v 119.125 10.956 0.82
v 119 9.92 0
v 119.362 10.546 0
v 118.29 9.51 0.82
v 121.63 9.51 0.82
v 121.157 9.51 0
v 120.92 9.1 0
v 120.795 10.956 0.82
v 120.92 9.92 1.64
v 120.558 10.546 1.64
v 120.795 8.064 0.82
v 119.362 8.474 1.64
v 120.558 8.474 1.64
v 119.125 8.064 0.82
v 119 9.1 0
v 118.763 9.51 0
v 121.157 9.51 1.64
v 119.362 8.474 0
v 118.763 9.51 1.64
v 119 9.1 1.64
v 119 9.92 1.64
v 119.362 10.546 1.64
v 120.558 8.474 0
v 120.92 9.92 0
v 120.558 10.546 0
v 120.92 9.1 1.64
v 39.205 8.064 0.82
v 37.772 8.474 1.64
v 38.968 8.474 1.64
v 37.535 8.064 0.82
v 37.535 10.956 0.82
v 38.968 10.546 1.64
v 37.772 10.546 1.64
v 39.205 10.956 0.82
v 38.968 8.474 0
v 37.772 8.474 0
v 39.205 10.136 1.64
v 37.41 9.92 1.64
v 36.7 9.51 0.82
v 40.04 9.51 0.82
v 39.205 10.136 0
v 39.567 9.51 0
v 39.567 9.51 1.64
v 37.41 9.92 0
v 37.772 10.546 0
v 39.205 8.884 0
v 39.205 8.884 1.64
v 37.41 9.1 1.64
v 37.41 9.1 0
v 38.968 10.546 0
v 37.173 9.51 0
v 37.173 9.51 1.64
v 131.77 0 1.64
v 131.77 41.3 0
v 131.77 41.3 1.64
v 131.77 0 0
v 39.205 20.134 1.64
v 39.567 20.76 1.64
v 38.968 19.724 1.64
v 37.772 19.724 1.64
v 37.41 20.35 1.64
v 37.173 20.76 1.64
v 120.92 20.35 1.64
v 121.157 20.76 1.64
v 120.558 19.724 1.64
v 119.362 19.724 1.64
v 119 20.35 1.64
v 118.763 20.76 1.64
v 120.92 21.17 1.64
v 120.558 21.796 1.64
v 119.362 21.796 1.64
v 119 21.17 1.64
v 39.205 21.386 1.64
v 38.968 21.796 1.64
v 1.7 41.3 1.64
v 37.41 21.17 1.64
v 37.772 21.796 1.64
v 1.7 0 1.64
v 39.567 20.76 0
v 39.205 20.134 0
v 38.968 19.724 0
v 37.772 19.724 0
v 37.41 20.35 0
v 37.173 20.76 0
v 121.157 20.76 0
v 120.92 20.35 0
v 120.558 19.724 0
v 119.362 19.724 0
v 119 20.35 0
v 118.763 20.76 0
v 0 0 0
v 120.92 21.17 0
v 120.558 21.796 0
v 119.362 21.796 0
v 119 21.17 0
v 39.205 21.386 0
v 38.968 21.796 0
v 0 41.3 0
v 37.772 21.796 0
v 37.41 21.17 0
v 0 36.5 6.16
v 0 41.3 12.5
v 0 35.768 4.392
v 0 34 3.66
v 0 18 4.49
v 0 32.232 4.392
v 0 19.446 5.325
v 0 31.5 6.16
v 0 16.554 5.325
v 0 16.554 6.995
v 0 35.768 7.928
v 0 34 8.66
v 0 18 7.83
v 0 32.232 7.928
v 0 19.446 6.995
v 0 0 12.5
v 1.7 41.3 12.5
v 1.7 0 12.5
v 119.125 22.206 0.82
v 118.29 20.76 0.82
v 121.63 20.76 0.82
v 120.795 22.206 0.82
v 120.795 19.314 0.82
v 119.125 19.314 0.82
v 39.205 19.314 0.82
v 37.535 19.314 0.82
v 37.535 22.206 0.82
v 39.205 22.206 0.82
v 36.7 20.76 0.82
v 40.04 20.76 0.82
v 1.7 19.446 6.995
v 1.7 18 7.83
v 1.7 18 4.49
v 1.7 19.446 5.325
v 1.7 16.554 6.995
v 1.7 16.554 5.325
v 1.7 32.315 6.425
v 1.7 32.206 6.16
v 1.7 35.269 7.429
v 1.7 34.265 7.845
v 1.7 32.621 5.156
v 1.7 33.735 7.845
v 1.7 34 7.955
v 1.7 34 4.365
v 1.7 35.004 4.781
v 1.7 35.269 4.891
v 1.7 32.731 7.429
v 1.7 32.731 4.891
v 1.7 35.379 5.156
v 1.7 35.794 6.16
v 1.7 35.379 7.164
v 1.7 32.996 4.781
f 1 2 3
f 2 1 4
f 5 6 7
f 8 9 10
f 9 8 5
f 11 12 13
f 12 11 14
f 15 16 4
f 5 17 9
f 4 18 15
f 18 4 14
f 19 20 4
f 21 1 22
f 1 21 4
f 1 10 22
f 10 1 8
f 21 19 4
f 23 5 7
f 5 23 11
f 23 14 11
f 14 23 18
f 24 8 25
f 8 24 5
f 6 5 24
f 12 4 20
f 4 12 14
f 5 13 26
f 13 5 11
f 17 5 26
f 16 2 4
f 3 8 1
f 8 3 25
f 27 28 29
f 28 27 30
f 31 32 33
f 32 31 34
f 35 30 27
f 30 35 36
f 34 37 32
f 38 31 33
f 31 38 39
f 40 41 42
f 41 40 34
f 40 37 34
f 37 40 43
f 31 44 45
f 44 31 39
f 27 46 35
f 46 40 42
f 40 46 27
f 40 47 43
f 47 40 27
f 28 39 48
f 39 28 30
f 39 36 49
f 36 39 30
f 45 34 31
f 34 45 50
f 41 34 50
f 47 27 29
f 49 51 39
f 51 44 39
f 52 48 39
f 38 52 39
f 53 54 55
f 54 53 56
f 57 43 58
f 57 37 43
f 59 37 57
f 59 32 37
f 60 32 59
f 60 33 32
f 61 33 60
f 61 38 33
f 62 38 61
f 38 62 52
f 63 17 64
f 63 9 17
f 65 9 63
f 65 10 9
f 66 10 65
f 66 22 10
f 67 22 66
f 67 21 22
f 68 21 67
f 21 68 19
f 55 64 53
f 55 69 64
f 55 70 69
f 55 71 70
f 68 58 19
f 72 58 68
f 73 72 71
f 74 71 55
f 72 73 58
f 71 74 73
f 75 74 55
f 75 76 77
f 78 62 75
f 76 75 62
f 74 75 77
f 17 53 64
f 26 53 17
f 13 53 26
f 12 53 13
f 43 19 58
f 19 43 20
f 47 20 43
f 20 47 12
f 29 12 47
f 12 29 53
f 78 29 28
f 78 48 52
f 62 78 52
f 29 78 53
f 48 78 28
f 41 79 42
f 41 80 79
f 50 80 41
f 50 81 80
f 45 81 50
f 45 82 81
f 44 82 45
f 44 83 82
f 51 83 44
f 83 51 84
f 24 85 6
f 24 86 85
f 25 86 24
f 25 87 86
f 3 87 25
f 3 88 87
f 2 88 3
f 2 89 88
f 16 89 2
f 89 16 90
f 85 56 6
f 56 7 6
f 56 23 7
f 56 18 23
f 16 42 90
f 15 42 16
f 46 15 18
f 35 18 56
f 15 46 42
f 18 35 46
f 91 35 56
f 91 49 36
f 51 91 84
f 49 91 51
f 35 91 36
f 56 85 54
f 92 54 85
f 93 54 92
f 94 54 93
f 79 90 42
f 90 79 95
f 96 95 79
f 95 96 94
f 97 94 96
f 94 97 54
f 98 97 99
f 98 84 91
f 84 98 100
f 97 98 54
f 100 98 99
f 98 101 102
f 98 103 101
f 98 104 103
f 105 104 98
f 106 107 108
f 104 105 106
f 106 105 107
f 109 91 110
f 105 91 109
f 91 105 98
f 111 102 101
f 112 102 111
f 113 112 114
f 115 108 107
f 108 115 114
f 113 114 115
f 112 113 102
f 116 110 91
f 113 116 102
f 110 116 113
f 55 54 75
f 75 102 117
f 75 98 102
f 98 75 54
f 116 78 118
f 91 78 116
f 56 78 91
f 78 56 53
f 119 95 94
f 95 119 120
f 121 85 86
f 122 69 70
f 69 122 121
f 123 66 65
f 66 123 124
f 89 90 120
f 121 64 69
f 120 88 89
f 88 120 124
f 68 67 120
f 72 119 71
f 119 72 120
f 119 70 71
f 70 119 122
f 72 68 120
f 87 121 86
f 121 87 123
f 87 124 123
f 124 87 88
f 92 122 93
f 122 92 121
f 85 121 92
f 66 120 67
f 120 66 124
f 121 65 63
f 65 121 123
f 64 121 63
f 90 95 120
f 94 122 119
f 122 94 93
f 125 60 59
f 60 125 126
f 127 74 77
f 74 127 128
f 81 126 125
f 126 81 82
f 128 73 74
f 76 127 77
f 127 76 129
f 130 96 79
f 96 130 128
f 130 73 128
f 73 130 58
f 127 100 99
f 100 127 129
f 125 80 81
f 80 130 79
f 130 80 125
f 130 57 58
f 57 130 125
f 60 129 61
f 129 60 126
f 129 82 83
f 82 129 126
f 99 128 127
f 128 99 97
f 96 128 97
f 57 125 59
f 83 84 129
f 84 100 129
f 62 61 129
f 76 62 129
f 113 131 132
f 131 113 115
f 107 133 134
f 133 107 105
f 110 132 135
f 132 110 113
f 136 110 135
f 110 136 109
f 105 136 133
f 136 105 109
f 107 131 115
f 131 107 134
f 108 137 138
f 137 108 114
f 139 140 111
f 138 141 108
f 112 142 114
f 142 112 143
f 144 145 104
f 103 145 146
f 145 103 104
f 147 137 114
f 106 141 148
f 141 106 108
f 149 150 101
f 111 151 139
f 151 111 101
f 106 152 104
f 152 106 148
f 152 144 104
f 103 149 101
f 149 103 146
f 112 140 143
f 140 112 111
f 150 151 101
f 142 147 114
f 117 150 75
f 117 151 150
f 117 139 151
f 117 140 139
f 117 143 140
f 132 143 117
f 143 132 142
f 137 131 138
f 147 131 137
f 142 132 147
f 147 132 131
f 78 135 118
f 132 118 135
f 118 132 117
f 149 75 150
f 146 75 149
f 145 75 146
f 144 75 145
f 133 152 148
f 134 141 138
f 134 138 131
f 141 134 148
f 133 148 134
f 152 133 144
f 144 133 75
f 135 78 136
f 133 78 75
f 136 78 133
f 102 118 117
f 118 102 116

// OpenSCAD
// a single 5.25" flex bay brace is a long cuboid with
// four holes, and a short cuboid with two. the holes
// of the two cuboids are not aligned, and the two
// sides of each brace are oriented.
h = 41.3;

difference(){
  cube([131.77, h, 1.64]);
  union(){
      translate([119.96, 9.51, 0.82]){
          sphere(1.67);
      }
      translate([38.37, 9.51, 0.82]){
          sphere(1.67);
      }
  }
  translate([119.96, 20.76, 0.82]){
          sphere(1.67);
      }
      translate([38.37, 20.76, 0.82]){
          sphere(1.67);
      }
  }

difference(){
    cube([1.7, h,12.5]);
    union(){
        translate([0, 18, 6.16]){
            rotate([0, 90, 0]){
                cylinder(2, 1.67, 1.67);
            }
        }
        translate([0, 34, 6.16]){
            rotate([0, 90, 0]){
                // FIXME should be an elliptical cylinder 5            mm x 3.33
                cylinder(2, 2.5, 1.67);
            }
        }
    }
}
